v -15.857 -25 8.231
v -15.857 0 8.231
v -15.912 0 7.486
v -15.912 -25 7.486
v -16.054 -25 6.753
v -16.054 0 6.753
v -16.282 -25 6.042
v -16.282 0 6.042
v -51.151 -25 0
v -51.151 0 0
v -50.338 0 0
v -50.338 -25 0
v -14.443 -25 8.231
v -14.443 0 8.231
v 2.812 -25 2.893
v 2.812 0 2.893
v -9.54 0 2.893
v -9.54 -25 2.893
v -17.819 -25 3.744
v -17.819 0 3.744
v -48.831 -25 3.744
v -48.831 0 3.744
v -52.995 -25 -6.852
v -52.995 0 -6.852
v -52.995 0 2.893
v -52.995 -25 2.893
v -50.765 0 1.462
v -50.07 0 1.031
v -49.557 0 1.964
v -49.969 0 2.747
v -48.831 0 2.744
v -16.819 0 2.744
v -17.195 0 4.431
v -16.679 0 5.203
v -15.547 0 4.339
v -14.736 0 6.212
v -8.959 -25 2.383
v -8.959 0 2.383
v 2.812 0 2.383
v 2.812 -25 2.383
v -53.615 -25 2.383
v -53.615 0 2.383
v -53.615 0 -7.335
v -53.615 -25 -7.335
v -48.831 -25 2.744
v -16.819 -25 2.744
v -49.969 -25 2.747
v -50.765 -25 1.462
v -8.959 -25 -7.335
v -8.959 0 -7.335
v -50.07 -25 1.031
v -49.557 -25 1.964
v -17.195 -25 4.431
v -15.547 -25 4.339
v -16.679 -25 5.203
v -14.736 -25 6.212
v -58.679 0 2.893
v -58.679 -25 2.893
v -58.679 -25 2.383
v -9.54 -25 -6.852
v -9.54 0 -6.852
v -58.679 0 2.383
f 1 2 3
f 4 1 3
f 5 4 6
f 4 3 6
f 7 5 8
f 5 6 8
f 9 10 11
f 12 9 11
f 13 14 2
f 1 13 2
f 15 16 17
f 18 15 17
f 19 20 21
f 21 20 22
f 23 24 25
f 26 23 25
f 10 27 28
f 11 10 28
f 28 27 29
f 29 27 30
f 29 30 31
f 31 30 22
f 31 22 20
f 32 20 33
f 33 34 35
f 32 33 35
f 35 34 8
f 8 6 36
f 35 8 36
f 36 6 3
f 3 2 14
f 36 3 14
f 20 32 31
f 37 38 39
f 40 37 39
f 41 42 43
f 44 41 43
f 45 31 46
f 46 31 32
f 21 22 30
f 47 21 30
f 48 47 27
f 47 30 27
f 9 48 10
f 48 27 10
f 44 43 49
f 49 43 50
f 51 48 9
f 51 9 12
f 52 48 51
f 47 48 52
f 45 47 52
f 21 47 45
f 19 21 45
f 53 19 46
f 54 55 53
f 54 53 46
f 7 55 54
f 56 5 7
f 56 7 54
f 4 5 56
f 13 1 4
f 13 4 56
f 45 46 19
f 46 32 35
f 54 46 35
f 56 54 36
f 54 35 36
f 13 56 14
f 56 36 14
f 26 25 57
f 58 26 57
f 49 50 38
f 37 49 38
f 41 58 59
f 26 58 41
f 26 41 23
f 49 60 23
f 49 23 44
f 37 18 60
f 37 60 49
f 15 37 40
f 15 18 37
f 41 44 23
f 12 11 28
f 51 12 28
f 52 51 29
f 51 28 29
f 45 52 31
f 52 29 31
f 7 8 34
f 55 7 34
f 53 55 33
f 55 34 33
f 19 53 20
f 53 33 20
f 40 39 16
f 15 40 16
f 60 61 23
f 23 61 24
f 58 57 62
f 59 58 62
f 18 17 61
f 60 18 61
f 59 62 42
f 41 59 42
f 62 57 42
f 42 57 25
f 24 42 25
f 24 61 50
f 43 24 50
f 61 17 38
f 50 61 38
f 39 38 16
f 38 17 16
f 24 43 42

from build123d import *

# Parameters (mm, degrees)
F1_DEPTH = 25
F3_DEPTH = 25


with BuildPart() as f1:
    # F0 (on Front) → F1 (new body)
    with BuildSketch(Plane.XZ):
        with BuildLine():
            Line((-48.831397, 2.743745), (-16.818714, 2.743745))
            ThreePointArc((-16.818714, 2.743745), (-15.079293, 5.248647), (-14.443458, 8.231235))
            Line((-14.443458, 8.231235), (-15.857441, 8.231235))
            ThreePointArc((-15.857441, 8.231235), (-15.972396, 7.117568), (-16.282061, 6.04166))
            ThreePointArc((-16.282061, 6.04166), (-16.923208, 4.807655), (-17.818714, 3.743745))
            Line((-17.818714, 3.743745), (-45.881545, 3.743745))
            Line((-45.881545, 3.743745), (-46.252962, 3.743745))
            Line((-46.252962, 3.743745), (-48.831397, 3.743745))
            ThreePointArc((-48.831397, 3.743745), (-50.414769, 2.134332), (-51.150908, 0))
            Line((-51.150908, 0), (-50.337797, 0))
            ThreePointArc((-50.337797, 0), (-49.842666, 1.51356), (-48.831397, 2.743745))
        make_face()
    extrude(amount=F1_DEPTH)


with BuildPart() as f3:
    # F2 (on Front) → F3 (new body)
    with BuildSketch(Plane.XZ):
        Polygon((-52.995481, -6.852399), (-52.995481, 2.892593), (-58.678601, 2.892593), (-58.678601, 2.382948), (-53.61452, 2.382948), (-53.61452, -7.334751), (-8.959459, -7.334751), (-8.959459, 2.382948), (2.812417, 2.382948), (2.812417, 2.892593), (-9.539651, 2.892593), (-9.539651, -6.852399), align=None)
    extrude(amount=F3_DEPTH)


solid = Compound([f1.part, f3.part])
